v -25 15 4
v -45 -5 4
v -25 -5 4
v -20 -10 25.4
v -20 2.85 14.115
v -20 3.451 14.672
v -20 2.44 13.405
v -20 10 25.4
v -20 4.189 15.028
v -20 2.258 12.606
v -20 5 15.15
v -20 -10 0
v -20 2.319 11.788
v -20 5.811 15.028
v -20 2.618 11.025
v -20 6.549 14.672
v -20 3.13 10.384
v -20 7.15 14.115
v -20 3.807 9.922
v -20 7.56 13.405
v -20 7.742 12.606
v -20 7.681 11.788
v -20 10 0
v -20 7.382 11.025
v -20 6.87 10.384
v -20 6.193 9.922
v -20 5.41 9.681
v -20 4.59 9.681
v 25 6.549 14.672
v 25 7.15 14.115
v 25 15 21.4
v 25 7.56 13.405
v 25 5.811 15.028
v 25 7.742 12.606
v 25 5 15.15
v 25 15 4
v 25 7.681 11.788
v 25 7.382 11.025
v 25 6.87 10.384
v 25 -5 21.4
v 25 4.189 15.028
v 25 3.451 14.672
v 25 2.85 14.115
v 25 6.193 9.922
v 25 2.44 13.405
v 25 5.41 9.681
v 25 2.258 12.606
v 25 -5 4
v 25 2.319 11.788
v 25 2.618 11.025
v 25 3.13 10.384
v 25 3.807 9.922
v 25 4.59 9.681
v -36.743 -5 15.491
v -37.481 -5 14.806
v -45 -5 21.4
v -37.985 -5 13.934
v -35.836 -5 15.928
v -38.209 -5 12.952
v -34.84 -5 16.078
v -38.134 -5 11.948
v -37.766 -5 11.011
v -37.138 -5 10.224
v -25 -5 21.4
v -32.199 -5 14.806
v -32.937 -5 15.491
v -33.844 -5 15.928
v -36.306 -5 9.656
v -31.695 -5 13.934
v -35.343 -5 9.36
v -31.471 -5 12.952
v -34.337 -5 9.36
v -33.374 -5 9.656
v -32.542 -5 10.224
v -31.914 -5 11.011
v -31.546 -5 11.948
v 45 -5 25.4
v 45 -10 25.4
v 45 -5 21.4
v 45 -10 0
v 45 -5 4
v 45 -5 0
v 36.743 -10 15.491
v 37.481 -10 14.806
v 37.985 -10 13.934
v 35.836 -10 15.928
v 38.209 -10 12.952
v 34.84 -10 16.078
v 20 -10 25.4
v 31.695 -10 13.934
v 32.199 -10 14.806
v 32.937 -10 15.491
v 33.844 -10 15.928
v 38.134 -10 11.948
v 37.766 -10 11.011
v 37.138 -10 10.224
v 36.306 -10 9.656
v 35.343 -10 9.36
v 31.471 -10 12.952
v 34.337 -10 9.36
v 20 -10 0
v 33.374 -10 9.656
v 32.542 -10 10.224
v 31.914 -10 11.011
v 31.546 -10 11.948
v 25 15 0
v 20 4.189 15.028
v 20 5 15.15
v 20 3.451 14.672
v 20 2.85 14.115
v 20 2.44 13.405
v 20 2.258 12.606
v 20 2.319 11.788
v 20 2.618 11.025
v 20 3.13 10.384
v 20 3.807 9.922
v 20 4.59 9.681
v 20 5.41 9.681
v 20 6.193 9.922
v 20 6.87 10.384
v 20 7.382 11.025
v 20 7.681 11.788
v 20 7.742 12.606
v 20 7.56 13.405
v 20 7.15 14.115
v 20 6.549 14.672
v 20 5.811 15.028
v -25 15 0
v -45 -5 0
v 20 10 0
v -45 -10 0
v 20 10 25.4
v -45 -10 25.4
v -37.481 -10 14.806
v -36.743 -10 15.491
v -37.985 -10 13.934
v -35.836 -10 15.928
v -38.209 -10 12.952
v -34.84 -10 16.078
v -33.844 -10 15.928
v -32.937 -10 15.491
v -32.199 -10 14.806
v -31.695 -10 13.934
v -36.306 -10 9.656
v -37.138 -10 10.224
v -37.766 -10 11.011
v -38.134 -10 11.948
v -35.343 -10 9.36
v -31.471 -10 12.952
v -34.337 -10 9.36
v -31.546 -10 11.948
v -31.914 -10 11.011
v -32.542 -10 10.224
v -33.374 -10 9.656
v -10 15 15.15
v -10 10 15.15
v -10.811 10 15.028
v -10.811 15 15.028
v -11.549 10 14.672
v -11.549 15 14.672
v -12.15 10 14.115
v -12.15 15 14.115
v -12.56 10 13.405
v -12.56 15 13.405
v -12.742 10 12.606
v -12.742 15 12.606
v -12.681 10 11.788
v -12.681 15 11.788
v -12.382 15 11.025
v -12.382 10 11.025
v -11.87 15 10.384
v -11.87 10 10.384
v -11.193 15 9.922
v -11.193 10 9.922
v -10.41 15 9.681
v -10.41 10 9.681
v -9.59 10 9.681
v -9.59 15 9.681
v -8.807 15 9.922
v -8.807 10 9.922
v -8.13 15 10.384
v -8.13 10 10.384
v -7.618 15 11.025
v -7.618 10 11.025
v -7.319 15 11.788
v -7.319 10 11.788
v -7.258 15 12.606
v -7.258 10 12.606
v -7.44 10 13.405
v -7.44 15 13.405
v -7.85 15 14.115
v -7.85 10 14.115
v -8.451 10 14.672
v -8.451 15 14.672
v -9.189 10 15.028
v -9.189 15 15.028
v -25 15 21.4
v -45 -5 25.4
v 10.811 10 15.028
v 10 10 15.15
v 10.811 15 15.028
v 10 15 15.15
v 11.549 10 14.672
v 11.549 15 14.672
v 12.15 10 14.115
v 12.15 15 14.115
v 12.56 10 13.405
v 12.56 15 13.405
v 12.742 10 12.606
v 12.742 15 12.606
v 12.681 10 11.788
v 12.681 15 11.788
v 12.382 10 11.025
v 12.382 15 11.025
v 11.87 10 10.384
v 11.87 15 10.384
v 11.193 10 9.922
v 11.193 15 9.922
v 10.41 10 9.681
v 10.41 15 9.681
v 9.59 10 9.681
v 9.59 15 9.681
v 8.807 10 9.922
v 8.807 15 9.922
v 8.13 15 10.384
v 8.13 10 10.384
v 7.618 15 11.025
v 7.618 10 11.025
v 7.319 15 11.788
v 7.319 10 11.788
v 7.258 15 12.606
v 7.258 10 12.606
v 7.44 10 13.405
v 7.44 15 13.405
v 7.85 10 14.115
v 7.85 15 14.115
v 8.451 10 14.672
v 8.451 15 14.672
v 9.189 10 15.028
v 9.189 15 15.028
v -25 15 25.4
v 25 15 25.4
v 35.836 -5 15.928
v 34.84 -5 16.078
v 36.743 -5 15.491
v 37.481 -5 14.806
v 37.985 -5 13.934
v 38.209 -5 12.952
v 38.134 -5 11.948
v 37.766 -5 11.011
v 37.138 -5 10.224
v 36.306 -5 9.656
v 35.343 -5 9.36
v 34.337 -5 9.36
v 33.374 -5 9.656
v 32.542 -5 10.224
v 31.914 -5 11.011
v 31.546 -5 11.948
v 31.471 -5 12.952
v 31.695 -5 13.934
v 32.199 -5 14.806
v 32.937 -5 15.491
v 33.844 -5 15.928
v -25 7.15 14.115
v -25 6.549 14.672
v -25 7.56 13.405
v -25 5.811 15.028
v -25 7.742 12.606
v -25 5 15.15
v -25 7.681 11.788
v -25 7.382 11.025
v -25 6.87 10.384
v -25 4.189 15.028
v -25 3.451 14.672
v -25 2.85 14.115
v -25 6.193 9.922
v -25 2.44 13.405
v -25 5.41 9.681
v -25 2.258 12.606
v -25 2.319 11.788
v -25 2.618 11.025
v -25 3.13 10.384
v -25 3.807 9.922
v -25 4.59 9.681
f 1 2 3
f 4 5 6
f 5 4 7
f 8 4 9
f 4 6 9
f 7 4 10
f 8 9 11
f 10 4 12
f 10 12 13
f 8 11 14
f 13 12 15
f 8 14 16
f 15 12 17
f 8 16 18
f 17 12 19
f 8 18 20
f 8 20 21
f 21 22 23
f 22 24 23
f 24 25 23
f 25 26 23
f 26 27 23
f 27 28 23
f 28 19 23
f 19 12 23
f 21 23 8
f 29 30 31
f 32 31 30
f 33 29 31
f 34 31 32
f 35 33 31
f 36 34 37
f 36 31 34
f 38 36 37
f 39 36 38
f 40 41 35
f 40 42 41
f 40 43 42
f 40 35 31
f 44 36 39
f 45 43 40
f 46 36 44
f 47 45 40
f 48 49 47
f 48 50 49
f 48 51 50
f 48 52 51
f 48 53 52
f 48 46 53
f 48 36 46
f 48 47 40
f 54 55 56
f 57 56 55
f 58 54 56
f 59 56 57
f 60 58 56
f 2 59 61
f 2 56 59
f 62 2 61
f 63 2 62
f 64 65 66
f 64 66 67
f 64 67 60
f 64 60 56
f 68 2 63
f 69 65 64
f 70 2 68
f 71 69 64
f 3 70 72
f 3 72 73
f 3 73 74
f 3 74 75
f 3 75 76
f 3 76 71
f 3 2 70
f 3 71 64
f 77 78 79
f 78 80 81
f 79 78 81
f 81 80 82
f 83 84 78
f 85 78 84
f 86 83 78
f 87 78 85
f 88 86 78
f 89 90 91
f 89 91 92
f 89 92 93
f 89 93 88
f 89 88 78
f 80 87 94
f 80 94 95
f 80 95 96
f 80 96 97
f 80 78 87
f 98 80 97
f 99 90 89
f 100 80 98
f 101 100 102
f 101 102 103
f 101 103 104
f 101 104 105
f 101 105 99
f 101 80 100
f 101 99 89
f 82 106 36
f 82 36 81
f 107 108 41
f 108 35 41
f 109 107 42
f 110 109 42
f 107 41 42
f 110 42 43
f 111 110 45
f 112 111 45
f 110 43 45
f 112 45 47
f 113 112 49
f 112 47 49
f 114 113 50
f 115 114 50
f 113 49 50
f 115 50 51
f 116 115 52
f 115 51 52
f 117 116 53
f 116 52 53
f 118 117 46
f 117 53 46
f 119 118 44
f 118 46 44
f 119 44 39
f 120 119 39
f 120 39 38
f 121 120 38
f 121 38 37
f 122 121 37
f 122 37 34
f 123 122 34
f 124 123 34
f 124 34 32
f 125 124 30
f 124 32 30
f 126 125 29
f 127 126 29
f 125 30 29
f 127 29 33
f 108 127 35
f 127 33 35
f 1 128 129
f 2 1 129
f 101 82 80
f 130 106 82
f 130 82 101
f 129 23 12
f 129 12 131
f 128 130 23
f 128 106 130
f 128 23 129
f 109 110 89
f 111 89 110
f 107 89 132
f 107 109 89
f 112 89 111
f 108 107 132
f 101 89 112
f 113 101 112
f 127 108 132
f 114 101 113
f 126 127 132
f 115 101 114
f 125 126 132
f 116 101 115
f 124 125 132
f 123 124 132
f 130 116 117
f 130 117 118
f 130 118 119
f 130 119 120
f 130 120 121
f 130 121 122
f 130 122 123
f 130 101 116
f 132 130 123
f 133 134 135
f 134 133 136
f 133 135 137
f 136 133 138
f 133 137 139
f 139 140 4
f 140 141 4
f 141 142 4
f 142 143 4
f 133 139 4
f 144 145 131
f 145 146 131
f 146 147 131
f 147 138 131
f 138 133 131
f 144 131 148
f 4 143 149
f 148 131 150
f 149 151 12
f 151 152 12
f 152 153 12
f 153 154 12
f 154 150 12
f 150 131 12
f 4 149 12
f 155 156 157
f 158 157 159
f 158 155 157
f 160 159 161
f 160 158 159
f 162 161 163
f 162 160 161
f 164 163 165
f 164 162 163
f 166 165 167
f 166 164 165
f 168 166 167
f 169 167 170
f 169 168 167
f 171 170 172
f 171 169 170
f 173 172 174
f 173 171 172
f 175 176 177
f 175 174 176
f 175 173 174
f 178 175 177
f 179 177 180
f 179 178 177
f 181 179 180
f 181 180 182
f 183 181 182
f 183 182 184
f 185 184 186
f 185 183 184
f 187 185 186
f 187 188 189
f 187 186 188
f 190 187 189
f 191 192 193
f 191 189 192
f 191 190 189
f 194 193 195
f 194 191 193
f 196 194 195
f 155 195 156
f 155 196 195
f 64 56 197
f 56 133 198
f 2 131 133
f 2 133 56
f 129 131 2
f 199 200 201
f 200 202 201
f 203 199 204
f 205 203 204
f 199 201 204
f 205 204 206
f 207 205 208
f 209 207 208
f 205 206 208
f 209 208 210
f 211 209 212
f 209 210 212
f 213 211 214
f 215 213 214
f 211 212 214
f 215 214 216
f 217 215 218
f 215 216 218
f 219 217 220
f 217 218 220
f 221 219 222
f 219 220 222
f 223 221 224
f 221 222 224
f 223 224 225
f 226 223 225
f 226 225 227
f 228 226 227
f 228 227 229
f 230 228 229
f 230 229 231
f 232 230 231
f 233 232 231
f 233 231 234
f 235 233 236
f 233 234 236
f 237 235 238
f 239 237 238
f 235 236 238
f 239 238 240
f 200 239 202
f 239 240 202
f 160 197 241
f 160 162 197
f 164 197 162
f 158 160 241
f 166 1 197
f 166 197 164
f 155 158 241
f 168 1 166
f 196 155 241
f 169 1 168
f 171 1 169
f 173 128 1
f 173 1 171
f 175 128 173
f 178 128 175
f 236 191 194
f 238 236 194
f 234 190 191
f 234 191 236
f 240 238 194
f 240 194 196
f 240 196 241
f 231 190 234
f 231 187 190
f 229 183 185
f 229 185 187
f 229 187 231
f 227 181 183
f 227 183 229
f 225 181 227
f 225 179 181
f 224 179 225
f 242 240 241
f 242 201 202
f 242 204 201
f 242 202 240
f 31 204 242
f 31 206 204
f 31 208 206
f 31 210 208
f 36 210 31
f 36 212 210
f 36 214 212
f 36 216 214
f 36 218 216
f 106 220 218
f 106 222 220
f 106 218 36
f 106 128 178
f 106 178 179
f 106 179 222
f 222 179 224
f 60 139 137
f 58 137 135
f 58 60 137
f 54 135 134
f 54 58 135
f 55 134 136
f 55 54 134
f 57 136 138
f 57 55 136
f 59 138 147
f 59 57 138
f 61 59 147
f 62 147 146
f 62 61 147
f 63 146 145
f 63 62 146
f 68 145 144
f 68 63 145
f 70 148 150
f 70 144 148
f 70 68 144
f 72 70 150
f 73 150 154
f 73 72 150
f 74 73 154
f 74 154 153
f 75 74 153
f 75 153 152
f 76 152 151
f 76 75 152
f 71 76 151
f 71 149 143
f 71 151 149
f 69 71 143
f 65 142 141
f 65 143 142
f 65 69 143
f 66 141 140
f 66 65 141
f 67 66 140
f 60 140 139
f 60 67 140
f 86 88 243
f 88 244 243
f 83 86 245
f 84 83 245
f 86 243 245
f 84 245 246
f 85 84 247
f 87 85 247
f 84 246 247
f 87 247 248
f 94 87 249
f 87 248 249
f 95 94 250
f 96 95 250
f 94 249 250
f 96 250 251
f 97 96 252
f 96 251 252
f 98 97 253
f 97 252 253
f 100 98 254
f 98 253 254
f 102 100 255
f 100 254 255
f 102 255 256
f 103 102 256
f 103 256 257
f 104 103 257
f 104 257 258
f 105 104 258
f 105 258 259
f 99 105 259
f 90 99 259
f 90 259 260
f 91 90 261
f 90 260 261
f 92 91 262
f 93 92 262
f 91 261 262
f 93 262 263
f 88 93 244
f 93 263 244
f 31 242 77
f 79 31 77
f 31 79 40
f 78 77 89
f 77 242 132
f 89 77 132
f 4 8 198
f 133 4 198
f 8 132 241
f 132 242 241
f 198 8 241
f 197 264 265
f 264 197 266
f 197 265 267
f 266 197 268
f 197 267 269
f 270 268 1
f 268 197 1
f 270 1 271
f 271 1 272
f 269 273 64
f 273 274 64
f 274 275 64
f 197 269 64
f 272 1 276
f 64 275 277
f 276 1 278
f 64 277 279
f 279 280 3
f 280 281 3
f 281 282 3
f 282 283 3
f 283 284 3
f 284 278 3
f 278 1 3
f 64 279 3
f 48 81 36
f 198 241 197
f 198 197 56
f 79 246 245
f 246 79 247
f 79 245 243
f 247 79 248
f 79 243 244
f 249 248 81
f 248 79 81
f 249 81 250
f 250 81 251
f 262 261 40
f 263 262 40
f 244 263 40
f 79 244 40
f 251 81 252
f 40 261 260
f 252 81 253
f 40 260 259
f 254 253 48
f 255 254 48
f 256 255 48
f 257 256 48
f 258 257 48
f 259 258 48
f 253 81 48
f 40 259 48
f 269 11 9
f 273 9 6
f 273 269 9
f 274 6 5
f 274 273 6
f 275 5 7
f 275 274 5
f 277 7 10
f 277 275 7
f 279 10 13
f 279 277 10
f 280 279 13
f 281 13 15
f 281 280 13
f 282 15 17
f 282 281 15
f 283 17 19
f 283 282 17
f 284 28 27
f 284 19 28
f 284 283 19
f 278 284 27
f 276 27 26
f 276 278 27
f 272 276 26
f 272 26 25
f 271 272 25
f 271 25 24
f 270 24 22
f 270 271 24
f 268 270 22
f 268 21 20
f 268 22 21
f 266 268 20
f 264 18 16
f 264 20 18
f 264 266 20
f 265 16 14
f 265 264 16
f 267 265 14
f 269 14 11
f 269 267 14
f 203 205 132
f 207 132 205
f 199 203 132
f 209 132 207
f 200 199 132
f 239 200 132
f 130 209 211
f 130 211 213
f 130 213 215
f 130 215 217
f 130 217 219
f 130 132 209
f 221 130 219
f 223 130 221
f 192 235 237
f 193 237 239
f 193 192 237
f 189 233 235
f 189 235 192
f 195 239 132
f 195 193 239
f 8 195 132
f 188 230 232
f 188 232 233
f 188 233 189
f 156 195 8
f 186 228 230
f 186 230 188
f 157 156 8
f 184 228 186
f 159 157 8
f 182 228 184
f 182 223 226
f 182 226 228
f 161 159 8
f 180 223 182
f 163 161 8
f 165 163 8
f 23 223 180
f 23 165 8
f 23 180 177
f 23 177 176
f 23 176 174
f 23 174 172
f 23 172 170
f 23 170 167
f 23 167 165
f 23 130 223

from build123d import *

# Parameters (mm, degrees)
BOSS_EXTRUDE1_DEPTH  = 25.4
BOSS_EXTRUDE2_DEPTH  = 4
MIRROR2_COPY_1_DEPTH = 4


with BuildPart() as part:
    # Sketch1 → Boss-Extrude1 (new body)
    with BuildSketch(Plane.XY):
        Polygon((-25, 15), (-25, -5), (-45, -5), (-45, -10), (-20, -10), (-20, 10), (0, 10), (0, 15), align=None)
    boss_extrude1 = extrude(amount=BOSS_EXTRUDE1_DEPTH)

    # Sketch1<3> → Boss-Extrude2 (add)
    with BuildSketch(Plane.XY):
        Polygon((-25, -5), (-25, 15), (-45, -5), align=None)
    boss_extrude2 = extrude(amount=BOSS_EXTRUDE2_DEPTH)

    # Mirror1: Boss-Extrude2 across plane
    add(boss_extrude2.mirror(Plane.XY.offset(12.7)))

    # Sketch3 → M5 Clearance Hole1 (revolve, cut)
    with BuildSketch(Plane(origin=(-10, 15, 12.4), x_dir=(0, 0, 1), z_dir=(1, 0, 0))):
        Polygon((0, 0), (0, 13.652366702), (2.75, 12), (2.75, 0), align=None)
    m5_clearance_hole1 = revolve(axis=Axis((-10, 21.35, 12.4), (0, -1, 0)), mode=Mode.SUBTRACT)

    # Sketch5 → M5 Clearance Hole2 (revolve, cut)
    with BuildSketch(Plane(origin=(-25, 5, 12.4), x_dir=(0, 0, 1), z_dir=(0, 1, 0))):
        Polygon((0, 0), (0, 13.652366702), (2.75, 12), (2.75, 0), align=None)
    m5_clearance_hole2 = revolve(axis=Axis((-31.35, 5, 12.4), (1, 0, 0)), mode=Mode.SUBTRACT)

    # Sketch7 → 1/4 Clearance Hole1 (revolve, cut)
    with BuildSketch(Plane(origin=(-34.84, -5, 12.7), x_dir=(0, 0, 1), z_dir=(1, 0, 0))):
        Polygon((0, 0), (0, 14.029827343), (3.3782, 12), (3.3782, 0), align=None)
    f_1_4_clearance_hole1 = revolve(axis=Axis((-34.84, 1.35, 12.7), (0, -1, 0)), mode=Mode.SUBTRACT)

    # Mirror2: Boss-Extrude1, Boss-Extrude2, M5 Clearance Hole1, M5 Clearance Hole2, 1/4 Clearance Hole1 across plane
    add(boss_extrude1.mirror(Plane(origin=(0, 0, 0), x_dir=(0, 0, 1), z_dir=(1, 0, 0))))
    add(boss_extrude2.mirror(Plane(origin=(0, 0, 0), x_dir=(0, 0, 1), z_dir=(1, 0, 0))))
    add(m5_clearance_hole1.mirror(Plane(origin=(0, 0, 0), x_dir=(0, 0, 1), z_dir=(1, 0, 0))), mode=Mode.SUBTRACT)
    add(m5_clearance_hole2.mirror(Plane(origin=(0, 0, 0), x_dir=(0, 0, 1), z_dir=(1, 0, 0))), mode=Mode.SUBTRACT)
    add(f_1_4_clearance_hole1.mirror(Plane(origin=(0, 0, 0), x_dir=(0, 0, 1), z_dir=(1, 0, 0))), mode=Mode.SUBTRACT)

    # Mirror2 copy 1 sketch → Mirror2 copy 1 (add)
    with BuildSketch(Plane(origin=(0, 0, 25.4), x_dir=(-1, 0, 0), z_dir=(0, 0, -1))):
        Polygon((-25, -5), (-25, 15), (-45, -5), align=None)
    extrude(amount=MIRROR2_COPY_1_DEPTH)


solid = part.part
